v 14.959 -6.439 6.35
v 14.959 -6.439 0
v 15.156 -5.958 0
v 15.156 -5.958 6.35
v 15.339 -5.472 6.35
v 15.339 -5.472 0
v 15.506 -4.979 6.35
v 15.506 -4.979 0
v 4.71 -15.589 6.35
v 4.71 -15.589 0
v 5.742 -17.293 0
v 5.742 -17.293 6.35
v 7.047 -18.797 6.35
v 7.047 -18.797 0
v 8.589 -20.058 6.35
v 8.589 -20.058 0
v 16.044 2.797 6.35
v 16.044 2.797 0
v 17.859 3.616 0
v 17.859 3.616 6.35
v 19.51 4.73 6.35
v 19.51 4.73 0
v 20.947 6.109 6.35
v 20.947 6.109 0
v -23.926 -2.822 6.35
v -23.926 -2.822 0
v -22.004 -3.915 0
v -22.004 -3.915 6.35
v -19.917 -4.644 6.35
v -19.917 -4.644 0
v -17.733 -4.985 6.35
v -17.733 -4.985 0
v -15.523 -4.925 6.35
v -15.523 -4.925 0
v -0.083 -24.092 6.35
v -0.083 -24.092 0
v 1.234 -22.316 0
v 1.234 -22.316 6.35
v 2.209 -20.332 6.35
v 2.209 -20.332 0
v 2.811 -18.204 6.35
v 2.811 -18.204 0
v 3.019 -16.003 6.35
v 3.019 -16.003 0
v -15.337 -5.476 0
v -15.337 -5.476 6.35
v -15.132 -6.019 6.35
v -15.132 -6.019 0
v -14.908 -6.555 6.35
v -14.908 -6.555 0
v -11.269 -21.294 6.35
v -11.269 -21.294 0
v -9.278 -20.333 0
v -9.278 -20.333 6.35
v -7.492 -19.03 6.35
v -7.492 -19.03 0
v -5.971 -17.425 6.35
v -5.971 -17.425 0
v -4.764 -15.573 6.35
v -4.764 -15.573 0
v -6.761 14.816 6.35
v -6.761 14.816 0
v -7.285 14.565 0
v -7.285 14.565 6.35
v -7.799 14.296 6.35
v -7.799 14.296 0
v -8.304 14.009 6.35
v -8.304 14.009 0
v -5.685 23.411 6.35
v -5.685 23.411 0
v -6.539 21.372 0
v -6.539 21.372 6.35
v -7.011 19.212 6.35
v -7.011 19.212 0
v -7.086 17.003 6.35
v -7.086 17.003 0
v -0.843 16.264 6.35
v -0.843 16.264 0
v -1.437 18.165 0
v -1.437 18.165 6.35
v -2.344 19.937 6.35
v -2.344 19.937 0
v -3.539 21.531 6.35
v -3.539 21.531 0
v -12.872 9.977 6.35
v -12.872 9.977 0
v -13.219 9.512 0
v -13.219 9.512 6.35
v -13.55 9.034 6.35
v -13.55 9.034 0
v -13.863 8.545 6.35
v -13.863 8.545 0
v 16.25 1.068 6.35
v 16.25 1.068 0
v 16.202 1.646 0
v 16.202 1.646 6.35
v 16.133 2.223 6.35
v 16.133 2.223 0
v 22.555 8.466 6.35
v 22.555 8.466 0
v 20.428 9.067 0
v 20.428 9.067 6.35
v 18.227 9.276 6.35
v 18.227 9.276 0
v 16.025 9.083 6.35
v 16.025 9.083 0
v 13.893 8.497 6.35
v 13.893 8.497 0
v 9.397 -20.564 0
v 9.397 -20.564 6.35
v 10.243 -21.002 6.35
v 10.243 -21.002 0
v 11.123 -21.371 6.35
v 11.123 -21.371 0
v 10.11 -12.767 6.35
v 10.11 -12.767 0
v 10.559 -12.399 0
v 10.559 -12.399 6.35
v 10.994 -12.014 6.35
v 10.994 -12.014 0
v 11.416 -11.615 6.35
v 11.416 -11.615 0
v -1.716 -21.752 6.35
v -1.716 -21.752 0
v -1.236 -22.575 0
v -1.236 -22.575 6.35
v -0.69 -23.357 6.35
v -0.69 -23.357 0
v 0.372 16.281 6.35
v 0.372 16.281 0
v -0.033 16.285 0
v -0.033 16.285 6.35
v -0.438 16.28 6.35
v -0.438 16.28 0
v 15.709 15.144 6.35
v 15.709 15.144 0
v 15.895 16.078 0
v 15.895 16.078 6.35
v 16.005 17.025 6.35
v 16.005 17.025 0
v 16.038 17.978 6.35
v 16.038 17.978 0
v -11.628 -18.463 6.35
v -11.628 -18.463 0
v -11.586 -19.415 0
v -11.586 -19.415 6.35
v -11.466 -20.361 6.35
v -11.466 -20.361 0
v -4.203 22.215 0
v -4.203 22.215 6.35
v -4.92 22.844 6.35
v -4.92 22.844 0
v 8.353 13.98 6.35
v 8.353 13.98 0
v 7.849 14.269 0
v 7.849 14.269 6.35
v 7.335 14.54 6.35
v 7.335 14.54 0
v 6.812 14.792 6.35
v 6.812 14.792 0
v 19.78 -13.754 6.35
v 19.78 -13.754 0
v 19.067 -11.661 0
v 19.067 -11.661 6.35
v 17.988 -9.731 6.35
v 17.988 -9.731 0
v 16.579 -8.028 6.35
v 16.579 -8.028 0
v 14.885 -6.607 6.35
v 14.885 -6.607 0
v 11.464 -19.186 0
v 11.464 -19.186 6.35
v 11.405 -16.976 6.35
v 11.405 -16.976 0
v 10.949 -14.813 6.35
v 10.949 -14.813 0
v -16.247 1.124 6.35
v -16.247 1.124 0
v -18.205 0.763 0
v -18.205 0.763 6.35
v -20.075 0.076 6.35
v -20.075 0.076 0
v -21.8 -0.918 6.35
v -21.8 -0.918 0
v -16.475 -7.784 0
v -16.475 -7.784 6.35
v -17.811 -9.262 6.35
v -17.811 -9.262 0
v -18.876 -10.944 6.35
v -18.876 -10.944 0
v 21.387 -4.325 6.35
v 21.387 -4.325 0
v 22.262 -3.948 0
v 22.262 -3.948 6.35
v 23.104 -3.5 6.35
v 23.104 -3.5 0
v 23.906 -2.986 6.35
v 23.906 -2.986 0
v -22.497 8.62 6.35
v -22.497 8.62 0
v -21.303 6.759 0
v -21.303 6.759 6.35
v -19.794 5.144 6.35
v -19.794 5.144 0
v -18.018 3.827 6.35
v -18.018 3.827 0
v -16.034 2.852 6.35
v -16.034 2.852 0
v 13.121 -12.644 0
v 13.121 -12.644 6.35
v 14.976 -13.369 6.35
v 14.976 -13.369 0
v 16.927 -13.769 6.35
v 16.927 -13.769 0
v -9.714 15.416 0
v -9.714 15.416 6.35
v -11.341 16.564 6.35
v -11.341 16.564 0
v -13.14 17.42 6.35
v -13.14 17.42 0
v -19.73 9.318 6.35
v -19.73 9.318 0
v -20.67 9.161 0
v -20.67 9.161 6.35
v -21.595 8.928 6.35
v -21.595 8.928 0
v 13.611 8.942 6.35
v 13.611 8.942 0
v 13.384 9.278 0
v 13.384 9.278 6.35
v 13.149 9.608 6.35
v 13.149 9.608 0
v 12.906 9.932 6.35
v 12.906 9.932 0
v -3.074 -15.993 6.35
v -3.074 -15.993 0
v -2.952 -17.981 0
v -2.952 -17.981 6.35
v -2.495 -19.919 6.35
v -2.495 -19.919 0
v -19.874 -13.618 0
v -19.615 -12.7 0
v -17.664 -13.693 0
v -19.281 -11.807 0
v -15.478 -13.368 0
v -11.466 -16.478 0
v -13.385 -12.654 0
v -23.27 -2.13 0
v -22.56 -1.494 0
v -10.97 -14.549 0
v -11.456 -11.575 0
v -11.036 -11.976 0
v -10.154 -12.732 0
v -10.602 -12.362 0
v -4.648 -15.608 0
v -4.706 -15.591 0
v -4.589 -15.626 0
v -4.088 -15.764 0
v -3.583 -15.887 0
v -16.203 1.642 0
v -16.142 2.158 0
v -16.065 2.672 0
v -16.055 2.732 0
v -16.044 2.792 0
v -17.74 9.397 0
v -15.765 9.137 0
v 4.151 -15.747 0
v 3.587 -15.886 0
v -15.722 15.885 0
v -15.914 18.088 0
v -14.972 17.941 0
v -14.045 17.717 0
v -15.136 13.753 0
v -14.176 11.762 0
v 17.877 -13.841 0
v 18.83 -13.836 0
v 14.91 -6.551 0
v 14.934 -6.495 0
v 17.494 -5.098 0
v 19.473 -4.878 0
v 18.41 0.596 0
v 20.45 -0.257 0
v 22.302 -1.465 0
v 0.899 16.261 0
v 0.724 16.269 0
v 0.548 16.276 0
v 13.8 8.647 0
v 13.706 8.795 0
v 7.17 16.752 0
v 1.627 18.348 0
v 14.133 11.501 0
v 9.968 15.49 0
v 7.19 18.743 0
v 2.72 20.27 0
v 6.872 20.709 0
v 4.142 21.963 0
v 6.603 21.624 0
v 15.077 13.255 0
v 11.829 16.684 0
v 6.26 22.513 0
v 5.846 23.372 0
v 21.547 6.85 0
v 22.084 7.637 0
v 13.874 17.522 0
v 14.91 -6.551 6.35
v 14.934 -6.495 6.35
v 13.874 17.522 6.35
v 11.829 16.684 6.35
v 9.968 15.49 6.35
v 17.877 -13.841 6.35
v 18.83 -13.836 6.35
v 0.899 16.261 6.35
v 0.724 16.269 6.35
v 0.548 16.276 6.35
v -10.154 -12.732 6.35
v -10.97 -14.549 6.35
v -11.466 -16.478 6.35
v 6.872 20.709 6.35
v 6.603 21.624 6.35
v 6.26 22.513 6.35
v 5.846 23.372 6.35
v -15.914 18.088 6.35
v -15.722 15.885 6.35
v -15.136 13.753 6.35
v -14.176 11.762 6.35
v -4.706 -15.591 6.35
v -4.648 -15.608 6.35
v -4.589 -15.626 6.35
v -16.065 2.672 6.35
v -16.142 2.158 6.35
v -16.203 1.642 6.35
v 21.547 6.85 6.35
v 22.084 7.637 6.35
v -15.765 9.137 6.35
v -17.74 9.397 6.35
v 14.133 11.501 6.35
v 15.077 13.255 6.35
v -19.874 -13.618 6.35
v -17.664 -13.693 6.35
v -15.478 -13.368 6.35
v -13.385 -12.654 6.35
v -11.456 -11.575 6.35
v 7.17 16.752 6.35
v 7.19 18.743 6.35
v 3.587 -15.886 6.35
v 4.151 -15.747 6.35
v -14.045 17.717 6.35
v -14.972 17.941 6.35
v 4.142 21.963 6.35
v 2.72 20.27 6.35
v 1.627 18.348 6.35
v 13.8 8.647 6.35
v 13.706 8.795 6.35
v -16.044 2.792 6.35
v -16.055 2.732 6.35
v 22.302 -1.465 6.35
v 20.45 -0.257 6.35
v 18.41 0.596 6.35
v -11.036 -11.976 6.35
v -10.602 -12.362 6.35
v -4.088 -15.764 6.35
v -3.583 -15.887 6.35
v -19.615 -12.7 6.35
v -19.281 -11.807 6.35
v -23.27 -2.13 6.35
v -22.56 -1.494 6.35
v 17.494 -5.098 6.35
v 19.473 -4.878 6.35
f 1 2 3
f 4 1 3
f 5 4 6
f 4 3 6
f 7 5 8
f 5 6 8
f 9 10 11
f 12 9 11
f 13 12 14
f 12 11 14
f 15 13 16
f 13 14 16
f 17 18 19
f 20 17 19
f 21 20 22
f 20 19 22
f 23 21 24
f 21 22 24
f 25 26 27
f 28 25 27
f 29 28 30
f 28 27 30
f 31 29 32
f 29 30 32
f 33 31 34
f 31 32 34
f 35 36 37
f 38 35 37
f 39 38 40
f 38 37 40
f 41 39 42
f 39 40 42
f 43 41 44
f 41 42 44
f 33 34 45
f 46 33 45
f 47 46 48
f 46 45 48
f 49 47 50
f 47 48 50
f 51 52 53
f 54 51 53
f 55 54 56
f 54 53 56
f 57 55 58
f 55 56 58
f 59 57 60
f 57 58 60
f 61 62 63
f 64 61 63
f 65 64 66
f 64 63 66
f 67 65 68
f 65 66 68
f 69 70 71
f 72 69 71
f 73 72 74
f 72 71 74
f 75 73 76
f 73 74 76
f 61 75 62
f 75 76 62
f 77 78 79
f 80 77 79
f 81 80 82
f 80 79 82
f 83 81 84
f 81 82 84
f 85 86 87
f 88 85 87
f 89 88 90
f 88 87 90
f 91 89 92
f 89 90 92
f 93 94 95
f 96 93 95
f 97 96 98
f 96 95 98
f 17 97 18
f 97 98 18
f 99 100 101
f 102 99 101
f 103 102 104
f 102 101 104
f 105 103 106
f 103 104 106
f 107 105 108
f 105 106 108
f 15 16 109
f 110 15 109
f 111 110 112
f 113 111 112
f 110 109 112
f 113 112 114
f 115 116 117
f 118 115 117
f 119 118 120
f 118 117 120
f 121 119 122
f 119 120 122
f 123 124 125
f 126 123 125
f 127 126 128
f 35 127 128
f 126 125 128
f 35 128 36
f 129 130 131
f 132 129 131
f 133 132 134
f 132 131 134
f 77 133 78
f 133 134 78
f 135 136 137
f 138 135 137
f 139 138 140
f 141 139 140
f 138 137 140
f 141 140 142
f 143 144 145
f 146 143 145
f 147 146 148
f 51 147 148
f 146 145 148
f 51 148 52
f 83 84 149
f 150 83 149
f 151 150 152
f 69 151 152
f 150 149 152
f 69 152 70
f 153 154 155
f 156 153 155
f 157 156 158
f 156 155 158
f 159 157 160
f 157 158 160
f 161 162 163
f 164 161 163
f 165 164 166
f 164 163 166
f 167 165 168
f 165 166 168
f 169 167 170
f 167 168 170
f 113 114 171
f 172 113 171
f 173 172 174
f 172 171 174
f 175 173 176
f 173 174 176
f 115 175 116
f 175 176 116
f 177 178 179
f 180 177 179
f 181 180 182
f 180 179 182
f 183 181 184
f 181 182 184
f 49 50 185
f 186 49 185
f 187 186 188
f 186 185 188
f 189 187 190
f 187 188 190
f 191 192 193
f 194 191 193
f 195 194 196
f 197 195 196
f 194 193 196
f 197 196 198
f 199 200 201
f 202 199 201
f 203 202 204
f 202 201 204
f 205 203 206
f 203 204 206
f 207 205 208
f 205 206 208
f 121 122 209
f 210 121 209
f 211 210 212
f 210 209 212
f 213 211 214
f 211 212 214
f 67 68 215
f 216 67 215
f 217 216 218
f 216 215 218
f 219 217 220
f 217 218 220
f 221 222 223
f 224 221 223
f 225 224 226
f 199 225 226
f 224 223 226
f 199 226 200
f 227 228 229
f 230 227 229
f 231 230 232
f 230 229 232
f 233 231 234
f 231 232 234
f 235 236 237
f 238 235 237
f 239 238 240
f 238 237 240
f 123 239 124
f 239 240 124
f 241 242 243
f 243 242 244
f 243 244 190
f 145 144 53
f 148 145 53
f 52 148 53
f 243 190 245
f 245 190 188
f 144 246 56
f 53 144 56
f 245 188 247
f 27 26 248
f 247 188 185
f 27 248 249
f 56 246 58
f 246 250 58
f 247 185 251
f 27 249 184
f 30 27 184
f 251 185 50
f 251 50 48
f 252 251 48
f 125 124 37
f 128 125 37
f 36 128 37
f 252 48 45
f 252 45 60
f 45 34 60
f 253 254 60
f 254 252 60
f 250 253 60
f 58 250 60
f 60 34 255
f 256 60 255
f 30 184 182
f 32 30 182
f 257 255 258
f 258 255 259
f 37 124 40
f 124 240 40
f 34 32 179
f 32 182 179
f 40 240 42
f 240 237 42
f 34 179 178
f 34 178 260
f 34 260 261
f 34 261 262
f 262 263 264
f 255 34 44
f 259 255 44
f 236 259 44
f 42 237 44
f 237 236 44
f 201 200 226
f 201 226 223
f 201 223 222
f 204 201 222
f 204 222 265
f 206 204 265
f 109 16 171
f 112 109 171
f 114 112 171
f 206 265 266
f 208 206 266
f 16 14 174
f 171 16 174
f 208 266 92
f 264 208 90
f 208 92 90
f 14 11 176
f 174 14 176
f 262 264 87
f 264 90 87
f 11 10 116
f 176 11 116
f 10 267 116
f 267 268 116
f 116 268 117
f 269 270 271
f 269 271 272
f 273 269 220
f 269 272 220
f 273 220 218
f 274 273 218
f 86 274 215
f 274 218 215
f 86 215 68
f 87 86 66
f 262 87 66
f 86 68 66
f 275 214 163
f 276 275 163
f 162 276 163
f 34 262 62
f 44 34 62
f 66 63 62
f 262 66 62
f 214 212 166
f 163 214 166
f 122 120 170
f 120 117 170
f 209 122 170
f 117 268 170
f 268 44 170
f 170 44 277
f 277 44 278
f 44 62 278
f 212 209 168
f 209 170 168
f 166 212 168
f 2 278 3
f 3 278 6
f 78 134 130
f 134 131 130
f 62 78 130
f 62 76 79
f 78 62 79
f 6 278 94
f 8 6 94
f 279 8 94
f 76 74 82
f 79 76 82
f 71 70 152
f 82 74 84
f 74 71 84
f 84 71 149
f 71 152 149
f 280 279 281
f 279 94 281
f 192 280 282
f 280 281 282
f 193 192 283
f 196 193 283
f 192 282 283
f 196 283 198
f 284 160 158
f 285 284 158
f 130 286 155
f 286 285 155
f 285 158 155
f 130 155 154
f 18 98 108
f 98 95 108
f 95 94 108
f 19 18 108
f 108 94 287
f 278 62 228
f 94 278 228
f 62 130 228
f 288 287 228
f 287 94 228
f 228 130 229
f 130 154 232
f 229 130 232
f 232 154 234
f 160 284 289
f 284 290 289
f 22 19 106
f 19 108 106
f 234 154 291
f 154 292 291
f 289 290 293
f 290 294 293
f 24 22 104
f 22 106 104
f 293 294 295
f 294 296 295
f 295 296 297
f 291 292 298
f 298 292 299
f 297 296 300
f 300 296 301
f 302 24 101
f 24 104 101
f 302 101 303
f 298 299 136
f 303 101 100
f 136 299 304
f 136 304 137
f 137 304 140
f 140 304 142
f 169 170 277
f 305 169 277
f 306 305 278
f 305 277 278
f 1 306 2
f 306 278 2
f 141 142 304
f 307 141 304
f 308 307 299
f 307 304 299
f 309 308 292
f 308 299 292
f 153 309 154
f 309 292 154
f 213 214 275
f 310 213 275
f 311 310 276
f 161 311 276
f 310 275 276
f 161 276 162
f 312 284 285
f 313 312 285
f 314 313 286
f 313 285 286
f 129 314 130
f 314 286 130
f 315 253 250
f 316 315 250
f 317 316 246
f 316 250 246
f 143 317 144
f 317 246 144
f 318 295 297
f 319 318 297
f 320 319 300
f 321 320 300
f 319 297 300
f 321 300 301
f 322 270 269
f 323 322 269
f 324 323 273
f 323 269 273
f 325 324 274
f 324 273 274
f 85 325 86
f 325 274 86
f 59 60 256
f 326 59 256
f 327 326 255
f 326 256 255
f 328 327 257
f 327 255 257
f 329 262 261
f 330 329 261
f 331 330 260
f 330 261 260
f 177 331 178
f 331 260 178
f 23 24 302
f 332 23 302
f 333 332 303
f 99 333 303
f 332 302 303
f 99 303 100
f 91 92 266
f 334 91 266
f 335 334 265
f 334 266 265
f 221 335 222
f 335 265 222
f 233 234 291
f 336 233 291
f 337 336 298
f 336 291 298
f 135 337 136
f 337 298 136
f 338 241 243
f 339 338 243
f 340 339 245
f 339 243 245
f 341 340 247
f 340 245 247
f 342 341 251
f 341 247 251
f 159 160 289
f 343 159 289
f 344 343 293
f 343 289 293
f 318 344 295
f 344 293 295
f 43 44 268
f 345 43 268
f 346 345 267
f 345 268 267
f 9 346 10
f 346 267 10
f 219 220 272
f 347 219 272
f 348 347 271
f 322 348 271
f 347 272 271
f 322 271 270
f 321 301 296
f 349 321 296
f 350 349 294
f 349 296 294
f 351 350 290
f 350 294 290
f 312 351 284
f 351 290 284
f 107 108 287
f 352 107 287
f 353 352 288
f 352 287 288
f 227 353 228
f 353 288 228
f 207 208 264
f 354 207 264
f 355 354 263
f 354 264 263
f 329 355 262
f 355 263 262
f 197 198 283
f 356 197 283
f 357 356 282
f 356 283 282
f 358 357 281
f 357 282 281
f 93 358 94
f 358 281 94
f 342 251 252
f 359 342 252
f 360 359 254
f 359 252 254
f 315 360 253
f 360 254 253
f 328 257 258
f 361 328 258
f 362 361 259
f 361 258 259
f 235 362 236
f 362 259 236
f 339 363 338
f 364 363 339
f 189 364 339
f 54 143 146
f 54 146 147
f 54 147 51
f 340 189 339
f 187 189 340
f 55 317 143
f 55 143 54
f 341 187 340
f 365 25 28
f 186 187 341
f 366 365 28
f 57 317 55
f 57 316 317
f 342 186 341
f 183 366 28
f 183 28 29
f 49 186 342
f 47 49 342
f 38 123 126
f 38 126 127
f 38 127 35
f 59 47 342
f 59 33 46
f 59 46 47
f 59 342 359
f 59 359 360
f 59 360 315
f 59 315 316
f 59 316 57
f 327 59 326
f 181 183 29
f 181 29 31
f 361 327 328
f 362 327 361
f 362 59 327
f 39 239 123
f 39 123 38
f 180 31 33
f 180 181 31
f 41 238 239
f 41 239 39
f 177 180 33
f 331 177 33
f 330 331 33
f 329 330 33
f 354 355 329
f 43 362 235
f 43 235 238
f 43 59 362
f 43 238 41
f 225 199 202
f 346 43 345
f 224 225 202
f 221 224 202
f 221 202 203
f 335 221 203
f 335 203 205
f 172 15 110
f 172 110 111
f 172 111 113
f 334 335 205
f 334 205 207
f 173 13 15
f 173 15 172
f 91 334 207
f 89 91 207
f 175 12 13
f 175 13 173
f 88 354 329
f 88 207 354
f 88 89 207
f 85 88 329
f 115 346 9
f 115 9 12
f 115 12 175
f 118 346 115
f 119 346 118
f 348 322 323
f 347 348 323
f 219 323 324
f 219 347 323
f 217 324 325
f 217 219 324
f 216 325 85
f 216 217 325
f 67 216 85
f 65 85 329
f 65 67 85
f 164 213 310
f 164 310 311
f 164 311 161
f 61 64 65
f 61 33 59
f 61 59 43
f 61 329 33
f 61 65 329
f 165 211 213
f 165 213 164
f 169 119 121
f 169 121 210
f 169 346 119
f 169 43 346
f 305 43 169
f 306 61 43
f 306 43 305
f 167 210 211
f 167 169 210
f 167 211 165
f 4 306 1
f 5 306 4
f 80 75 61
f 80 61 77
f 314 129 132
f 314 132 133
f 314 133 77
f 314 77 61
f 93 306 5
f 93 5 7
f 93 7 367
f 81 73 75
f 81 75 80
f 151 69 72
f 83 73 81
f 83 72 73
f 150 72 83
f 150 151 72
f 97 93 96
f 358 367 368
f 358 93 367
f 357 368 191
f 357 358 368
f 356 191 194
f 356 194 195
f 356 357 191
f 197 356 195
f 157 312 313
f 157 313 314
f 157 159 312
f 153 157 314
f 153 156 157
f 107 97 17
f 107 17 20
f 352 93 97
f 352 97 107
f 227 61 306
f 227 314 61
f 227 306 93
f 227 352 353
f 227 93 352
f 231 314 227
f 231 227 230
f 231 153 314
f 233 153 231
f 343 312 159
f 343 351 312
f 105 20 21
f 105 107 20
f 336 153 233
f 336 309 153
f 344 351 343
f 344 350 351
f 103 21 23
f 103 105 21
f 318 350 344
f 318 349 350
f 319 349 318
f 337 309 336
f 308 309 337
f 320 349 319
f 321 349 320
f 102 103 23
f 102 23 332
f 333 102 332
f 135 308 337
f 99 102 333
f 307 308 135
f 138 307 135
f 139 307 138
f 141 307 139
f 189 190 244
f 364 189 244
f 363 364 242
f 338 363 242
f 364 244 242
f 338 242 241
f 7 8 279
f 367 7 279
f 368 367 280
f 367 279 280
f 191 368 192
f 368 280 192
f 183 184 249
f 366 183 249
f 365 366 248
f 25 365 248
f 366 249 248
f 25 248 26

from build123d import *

# Parameters (mm, degrees)
F1_DEPTH = 6.35
F2_COUNT = 13


with BuildPart() as f1:
    # F0 (on Top) → F1 (new body)
    with BuildSketch(Plane.XY):
        with BuildLine():
            ThreePointArc((-2.1437179533, 7.8720496255), (-8.1726662795, 2.7780663468), (-16.0647920269, 2.6720722418))
            ThreePointArc((-16.0647920269, 2.6720722418), (-1.3405858897, -16.2302292777), (16.2855000824, 0))
            ThreePointArc((16.2855000824, 0), (15.6024784663, 4.6669238952), (13.6107061205, 8.9423817764))
            ThreePointArc((13.6107061205, 8.9423817764), (5.9298500897, 5.517014013), (-2.1437179533, 7.8720496255))
        make_face()
        with BuildLine():
            ThreePointArc((-6.7606438886, 14.815910608), (-12.9274256428, 9.9045029751), (-16.0647920269, 2.6720722418))
            ThreePointArc((-16.0647920269, 2.6720722418), (-8.1726662795, 2.7780663468), (-2.1437179533, 7.8720496255))
            ThreePointArc((-2.1437179533, 7.8720496255), (-5.0634420885, 10.9375567243), (-6.7606438886, 14.815910608))
        make_face()
        with BuildLine():
            ThreePointArc((-3.5394354787, 21.5305990191), (-4.554792608, 22.5366665267), (-5.6852551034, 23.4114101898))
            ThreePointArc((-5.6852551034, 23.4114101898), (-7.0109905191, 19.2122527461), (-6.7606438886, 14.815910608))
            ThreePointArc((-6.7606438886, 14.815910608), (-3.8699558436, 15.8190061225), (-0.8426569014, 16.2636847695))
            ThreePointArc((-0.8426569014, 16.2636847695), (-1.8525780021, 19.0704452205), (-3.5394354787, 21.5305990191))
        make_face()
        with BuildLine():
            ThreePointArc((-2.1437179533, 7.8720496255), (5.9298500897, 5.517014013), (13.6107061205, 8.9423817764))
            ThreePointArc((13.6107061205, 8.9423817764), (7.3590855135, 14.5279514502), (-0.8426569014, 16.2636847695))
            ThreePointArc((-0.8426569014, 16.2636847695), (-0.6359958834, 15.0084567204), (-0.5668363347, 13.7382113944))
            ThreePointArc((-0.5668363347, 13.7382113944), (-0.9679319708, 10.7010083415), (-2.1437179533, 7.8720496255))
        make_face()
        with BuildLine():
            ThreePointArc((-0.8426569014, 16.2636847695), (-3.8699558436, 15.8190061225), (-6.7606438886, 14.815910608))
            ThreePointArc((-6.7606438886, 14.815910608), (-5.0634420885, 10.9375567243), (-2.1437179533, 7.8720496255))
            ThreePointArc((-2.1437179533, 7.8720496255), (-0.9679319708, 10.7010083415), (-0.5668363347, 13.7382113944))
            ThreePointArc((-0.5668363347, 13.7382113944), (-0.6359958834, 15.0084567204), (-0.8426569014, 16.2636847695))
        make_face()
    extrude(amount=F1_DEPTH)

    # F2: F1 ×13 about axis
    f2_axis = Axis((0, 0, 6.35), (0, 0, 1))


with BuildPart() as f1_1:
    add(f1.part)
    for i in range(1, F2_COUNT):
        add(f1.part.rotate(f2_axis, i * 360 / F2_COUNT))


solid = f1_1.part
